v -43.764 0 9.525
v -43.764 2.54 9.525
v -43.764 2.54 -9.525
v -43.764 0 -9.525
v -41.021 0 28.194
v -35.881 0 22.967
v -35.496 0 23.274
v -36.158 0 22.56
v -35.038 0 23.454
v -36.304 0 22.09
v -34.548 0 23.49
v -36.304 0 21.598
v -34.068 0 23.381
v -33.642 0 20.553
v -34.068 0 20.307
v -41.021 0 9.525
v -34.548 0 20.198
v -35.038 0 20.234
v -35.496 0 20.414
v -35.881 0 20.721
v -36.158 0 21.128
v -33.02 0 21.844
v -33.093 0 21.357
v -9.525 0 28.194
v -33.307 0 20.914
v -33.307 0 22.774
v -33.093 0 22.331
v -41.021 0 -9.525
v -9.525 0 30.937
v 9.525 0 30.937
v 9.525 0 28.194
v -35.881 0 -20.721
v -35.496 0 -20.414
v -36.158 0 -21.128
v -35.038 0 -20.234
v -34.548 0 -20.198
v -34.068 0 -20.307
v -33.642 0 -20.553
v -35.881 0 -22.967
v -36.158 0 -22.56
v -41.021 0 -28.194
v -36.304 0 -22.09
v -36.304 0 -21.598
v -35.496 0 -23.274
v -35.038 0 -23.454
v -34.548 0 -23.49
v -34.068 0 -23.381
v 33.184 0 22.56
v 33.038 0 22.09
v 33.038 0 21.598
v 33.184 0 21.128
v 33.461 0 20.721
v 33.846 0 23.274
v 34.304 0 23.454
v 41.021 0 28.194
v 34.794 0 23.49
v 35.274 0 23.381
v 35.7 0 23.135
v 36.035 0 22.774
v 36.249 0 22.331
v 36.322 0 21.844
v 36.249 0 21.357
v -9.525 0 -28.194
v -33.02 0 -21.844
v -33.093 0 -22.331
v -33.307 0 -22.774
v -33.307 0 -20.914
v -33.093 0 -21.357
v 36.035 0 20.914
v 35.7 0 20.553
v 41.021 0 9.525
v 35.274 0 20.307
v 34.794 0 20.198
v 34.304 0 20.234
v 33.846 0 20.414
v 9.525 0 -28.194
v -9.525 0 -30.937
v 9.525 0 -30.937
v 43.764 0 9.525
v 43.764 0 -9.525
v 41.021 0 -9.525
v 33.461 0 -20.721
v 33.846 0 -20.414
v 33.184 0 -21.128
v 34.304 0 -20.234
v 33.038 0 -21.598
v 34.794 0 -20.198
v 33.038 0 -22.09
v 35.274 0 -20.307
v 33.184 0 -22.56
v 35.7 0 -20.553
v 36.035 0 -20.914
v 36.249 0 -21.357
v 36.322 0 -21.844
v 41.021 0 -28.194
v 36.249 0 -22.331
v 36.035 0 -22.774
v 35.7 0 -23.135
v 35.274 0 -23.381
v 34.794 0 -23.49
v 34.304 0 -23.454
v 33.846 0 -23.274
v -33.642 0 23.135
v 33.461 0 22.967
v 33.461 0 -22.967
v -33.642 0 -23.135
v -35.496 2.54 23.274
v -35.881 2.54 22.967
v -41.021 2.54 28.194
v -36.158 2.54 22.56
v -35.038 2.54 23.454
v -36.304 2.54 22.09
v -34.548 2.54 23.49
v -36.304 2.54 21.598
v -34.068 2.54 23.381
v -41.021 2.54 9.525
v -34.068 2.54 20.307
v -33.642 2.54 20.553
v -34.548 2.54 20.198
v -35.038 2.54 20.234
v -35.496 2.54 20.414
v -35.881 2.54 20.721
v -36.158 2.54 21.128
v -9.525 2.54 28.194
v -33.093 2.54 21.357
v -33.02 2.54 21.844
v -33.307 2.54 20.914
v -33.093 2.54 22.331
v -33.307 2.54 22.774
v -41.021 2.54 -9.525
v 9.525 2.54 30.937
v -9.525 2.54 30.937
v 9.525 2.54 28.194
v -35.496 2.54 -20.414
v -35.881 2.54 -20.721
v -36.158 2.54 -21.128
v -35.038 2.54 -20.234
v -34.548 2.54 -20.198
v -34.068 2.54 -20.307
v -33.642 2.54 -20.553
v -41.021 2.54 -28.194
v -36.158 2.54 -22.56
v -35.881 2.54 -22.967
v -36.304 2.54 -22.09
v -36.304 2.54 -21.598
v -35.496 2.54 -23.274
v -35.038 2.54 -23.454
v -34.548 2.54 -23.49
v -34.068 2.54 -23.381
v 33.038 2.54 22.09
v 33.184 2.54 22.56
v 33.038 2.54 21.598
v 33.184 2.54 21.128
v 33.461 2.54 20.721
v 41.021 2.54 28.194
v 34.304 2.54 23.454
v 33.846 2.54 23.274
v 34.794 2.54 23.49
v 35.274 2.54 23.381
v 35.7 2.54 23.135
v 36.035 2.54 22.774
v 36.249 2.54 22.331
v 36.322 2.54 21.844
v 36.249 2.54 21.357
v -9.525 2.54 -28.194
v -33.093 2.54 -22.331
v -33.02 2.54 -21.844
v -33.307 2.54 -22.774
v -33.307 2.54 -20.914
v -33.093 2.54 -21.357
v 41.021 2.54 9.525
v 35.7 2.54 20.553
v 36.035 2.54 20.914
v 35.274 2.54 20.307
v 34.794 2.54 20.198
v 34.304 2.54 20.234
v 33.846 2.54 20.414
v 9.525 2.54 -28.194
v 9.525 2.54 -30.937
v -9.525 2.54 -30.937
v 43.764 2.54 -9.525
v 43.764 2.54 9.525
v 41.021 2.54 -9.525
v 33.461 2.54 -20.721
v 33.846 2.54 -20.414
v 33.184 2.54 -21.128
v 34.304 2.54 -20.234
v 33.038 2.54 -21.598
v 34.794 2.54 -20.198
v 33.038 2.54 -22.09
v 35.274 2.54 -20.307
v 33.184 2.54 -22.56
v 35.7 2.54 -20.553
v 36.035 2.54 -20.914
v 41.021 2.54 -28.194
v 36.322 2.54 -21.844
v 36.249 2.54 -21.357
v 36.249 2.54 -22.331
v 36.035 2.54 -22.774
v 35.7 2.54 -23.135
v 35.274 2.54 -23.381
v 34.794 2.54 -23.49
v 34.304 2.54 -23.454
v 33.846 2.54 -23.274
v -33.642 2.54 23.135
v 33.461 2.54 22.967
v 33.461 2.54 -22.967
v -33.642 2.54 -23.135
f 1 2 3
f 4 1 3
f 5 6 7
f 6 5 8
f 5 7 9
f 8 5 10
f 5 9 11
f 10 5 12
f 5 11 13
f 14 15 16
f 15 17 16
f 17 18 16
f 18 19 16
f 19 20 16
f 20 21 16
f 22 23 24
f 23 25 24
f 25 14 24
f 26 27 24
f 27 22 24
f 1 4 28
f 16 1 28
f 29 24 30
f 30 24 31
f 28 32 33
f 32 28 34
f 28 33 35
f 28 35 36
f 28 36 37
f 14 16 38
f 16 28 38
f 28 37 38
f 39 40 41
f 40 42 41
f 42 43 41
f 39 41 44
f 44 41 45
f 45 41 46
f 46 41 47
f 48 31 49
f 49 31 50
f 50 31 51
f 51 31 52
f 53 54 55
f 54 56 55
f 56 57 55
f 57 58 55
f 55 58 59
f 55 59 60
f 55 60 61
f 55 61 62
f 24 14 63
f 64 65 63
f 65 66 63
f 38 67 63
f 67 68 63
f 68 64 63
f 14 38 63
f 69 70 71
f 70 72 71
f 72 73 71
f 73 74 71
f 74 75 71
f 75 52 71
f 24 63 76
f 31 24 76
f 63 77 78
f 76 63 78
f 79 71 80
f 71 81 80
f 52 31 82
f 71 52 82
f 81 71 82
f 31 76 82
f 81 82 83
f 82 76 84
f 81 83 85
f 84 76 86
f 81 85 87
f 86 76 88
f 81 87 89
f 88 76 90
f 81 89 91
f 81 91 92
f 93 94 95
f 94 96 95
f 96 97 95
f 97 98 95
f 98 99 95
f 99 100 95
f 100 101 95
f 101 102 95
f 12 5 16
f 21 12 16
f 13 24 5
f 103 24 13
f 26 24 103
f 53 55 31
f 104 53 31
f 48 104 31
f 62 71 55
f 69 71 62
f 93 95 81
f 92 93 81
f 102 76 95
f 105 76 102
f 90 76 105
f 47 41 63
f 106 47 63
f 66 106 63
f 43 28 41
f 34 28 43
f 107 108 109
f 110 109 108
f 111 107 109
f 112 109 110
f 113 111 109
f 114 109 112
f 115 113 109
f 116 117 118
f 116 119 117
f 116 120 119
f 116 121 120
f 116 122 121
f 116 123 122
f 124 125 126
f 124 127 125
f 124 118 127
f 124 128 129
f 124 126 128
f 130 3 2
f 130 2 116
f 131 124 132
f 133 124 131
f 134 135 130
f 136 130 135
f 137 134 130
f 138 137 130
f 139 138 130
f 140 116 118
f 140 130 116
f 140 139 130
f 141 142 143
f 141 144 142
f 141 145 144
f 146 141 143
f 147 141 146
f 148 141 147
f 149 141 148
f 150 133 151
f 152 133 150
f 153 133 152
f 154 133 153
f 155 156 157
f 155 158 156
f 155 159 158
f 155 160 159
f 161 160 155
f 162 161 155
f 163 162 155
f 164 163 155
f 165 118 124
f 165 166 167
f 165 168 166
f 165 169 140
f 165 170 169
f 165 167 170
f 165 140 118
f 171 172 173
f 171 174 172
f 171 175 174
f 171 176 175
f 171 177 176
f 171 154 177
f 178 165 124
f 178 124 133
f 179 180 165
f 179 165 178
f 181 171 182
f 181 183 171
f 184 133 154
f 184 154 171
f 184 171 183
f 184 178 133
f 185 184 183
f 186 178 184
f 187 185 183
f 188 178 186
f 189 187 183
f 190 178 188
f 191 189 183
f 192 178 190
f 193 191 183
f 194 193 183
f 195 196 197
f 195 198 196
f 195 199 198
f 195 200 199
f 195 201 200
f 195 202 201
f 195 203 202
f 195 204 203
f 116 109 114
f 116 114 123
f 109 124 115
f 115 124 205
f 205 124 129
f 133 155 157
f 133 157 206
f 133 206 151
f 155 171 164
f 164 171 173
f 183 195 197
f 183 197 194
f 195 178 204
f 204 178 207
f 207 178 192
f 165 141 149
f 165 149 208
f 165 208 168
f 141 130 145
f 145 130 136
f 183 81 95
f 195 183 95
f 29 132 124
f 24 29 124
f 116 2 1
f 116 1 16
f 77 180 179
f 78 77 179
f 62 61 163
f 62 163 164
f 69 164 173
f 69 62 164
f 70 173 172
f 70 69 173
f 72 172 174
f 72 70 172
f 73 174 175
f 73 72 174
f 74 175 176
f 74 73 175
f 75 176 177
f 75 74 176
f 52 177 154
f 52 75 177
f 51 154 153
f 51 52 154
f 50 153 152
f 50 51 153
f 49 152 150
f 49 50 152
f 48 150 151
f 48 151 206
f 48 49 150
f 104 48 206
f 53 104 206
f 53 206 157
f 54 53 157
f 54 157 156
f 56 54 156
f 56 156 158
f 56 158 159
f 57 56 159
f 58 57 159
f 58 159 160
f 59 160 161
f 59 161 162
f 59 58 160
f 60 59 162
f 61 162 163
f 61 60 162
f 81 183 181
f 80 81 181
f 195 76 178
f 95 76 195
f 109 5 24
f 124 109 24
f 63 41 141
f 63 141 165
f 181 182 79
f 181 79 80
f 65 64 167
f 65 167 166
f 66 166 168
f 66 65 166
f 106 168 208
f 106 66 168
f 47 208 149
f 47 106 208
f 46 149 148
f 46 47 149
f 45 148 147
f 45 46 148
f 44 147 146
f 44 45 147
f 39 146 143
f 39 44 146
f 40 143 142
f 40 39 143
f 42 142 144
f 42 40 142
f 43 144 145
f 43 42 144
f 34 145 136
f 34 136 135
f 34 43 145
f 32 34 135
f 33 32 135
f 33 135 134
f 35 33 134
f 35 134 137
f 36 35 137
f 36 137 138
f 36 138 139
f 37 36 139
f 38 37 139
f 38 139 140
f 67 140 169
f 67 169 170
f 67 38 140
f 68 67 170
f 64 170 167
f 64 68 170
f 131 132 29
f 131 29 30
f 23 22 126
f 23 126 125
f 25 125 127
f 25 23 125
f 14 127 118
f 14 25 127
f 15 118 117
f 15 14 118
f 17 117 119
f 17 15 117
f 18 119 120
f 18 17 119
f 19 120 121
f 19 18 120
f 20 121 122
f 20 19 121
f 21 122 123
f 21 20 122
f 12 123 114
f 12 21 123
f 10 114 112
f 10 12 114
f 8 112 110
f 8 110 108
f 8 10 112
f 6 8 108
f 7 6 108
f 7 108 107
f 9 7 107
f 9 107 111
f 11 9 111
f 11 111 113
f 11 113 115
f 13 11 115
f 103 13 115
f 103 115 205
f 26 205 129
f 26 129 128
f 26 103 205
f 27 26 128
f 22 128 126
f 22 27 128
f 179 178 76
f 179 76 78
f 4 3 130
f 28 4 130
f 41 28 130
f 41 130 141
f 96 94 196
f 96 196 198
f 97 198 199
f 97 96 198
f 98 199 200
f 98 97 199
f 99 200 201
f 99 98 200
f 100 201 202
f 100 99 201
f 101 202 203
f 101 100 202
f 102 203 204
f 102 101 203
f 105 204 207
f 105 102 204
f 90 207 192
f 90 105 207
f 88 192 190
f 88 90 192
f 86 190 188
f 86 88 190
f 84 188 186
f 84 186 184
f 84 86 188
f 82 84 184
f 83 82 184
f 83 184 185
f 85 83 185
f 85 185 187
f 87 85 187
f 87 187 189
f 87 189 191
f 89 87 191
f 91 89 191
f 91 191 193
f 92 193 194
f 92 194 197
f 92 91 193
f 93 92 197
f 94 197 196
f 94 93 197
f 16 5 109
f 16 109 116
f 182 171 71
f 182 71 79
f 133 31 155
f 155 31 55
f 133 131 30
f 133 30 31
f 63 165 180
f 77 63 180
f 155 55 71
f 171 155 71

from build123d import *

# Parameters (mm, degrees)
SKETCH1_W           = 82.042
SKETCH1_H           = 56.388
SKETCH1_R           = 1.651
BOSS_EXTRUDE1_DEPTH = 2.54
SKETCH2_W           = 19.05
SKETCH2_H           = 2.7432
SKETCH2_W_2         = 2.7432
SKETCH2_H_2         = 19.05
BOSS_EXTRUDE2_DEPTH = 2.54


with BuildPart() as part:
    # Sketch1 → Boss-Extrude1 (new body)
    with BuildSketch(Plane(origin=(0, 0, 0), x_dir=(1, 0, 0), z_dir=(0, 1, 0))):
        Rectangle(SKETCH1_W, SKETCH1_H)
        with Locations((-34.671, 21.844)):
            Circle(SKETCH1_R, mode=Mode.SUBTRACT)
        with Locations((-34.671, -21.844)):
            Circle(SKETCH1_R, mode=Mode.SUBTRACT)
        with Locations((34.671, -21.844)):
            Circle(SKETCH1_R, mode=Mode.SUBTRACT)
        with Locations((34.671, 21.844)):
            Circle(SKETCH1_R, mode=Mode.SUBTRACT)
    extrude(amount=BOSS_EXTRUDE1_DEPTH)

    # Sketch2 → Boss-Extrude2 (add)
    with BuildSketch(Plane(origin=(0, 2.54, 0), x_dir=(1, 0, 0), z_dir=(0, 1, 0))):
        with Locations((0, 29.5656)):
            Rectangle(SKETCH2_W, SKETCH2_H)
        with Locations((0, -29.5656)):
            Rectangle(SKETCH2_W, SKETCH2_H)
        with Locations((42.3926, 0)):
            Rectangle(SKETCH2_W_2, SKETCH2_H_2)
        with Locations((-42.3926, 0)):
            Rectangle(SKETCH2_W_2, SKETCH2_H_2)
    extrude(amount=-BOSS_EXTRUDE2_DEPTH)


solid = part.part
